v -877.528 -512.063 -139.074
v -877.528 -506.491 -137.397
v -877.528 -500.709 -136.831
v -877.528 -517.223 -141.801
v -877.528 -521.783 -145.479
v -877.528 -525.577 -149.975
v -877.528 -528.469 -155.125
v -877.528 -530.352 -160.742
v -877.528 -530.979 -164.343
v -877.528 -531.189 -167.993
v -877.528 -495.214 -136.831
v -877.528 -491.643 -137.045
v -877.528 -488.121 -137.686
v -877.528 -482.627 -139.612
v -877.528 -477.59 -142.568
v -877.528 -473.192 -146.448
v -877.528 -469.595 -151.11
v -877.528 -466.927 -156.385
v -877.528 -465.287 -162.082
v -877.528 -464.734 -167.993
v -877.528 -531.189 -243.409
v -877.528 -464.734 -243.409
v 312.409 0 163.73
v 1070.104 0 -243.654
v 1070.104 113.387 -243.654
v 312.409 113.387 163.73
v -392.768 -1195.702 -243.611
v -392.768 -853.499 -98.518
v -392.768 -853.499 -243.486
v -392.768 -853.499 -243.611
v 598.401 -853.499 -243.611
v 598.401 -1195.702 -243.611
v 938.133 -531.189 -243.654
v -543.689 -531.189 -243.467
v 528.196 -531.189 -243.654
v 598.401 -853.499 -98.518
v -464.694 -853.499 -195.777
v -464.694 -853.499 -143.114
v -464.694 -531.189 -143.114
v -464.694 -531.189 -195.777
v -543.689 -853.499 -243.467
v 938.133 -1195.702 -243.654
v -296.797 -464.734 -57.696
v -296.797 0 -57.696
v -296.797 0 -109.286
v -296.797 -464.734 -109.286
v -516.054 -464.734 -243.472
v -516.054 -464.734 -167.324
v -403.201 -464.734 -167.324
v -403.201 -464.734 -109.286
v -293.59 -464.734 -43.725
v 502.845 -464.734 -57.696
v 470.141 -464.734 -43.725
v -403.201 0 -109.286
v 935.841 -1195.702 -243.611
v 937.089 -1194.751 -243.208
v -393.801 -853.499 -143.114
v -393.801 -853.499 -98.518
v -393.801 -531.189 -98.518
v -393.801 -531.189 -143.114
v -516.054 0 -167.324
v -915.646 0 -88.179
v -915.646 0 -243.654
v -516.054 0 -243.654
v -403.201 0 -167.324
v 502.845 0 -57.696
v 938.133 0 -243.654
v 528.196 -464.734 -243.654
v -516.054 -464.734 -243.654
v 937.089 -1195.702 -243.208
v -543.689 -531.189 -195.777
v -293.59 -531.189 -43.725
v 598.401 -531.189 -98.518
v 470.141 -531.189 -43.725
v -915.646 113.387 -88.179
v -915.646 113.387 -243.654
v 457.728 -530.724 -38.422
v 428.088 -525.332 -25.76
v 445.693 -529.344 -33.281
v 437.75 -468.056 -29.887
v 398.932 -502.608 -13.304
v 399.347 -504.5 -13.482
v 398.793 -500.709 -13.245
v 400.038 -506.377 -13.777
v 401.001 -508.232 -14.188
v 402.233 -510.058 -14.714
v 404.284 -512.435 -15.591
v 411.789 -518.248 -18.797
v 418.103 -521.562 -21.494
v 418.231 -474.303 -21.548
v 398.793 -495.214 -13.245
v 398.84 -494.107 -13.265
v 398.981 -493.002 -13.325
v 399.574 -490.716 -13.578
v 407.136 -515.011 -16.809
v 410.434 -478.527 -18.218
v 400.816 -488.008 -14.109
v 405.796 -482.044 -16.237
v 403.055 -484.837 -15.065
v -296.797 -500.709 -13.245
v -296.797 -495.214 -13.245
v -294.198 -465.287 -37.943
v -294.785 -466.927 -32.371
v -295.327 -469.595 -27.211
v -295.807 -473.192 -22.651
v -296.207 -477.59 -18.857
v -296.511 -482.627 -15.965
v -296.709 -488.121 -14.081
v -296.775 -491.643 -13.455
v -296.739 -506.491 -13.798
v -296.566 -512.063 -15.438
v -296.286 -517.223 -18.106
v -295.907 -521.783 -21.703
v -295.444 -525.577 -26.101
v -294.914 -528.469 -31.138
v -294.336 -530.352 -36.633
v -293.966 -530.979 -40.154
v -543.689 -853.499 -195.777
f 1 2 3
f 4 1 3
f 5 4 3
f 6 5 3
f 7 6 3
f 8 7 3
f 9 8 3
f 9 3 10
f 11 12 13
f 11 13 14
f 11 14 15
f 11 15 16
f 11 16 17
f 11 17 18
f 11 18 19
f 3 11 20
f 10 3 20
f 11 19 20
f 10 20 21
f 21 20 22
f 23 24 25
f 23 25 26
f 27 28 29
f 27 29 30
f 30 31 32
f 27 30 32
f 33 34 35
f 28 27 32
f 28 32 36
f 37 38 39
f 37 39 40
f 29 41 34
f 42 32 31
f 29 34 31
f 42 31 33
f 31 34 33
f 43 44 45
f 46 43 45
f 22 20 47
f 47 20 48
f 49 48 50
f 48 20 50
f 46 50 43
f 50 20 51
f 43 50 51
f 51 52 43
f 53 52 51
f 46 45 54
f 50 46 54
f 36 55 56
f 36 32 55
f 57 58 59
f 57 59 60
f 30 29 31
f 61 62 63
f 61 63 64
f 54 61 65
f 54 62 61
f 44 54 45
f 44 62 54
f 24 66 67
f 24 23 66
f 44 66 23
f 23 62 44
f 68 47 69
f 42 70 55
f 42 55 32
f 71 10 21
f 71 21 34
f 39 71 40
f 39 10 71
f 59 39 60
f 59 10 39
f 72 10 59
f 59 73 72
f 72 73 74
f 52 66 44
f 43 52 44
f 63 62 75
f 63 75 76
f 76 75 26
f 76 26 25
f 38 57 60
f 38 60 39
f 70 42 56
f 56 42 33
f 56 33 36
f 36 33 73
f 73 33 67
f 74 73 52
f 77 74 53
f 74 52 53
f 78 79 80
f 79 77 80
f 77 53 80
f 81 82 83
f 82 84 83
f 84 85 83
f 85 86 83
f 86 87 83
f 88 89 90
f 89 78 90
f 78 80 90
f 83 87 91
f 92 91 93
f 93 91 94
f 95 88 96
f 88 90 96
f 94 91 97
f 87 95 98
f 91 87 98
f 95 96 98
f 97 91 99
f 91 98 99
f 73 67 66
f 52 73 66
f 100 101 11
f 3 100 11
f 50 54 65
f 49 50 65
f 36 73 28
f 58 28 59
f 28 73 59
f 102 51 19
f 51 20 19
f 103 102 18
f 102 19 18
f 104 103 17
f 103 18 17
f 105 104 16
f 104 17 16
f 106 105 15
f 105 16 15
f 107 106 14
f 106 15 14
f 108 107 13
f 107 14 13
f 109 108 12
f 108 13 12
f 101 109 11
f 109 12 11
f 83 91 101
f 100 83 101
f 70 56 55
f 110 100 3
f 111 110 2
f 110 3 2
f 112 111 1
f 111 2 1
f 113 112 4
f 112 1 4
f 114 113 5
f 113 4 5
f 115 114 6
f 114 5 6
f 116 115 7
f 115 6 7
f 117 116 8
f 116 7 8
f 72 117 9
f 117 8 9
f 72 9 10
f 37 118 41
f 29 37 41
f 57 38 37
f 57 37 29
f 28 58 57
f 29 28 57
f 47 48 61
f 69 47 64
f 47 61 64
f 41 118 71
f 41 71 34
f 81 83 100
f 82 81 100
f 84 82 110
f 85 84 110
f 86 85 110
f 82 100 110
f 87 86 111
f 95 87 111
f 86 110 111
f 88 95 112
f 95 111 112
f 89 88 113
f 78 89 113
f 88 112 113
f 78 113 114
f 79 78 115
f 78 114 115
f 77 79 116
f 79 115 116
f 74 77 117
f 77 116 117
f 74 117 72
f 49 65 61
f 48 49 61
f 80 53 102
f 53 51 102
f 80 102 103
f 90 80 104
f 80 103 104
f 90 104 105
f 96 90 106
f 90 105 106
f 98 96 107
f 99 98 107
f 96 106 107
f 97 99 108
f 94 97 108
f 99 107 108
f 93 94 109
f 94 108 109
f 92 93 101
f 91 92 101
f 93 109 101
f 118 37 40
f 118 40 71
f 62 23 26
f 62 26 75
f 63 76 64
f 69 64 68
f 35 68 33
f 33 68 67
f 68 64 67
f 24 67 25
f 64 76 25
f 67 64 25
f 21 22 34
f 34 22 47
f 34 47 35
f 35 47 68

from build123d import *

# Parameters (mm, degrees)
F1_DEPTH     = 113.387234509
F3_DEPTH     = 464.7335410118
F5_DEPTH     = 66.4555206895
F6_R         = 30.48
F8_DEPTH     = 322.3102986813
F10_DEPTH    = 342.2025442123
F12_DEPTH    = 991.1689758301
F13_T4_DEPTH = 1291.048119331


# Not quite as in the source:
# - a fillet or chamfer that OpenCascade refuses, or shapes differently, is made with other operations: its cross-section is extruded or revolved along the edge and cut away or added


with BuildPart() as f1:
    # F0 (on Front) → F1 (new body)
    with BuildSketch(Plane.XZ):
        Polygon((-915.6464338303, -243.6540126801), (1070.1038837433, -243.6540126801), (312.4090433121, 163.7299656868), (-915.6464338303, -88.1789922714), align=None)
    extrude(amount=-F1_DEPTH)

    # F2 (on face) → F3 (join)
    with BuildSketch(Plane.XZ):
        Polygon((-516.0537958145, -243.6540126801), (938.1332397461, -243.6540126801), (502.8445720673, -57.6961040497), (-296.7971563339, -57.6961040497), (-296.7971563339, -109.2859506607), (-403.2011032104, -109.2859506607), (-403.2011032104, -167.32442379), (-516.0537958145, -167.32442379), align=None)
    extrude(amount=F3_DEPTH)

    # F4 (on face) → F5 (join)
    with BuildSketch(Plane.XZ.offset(464.7335410118)):
        Polygon((528.1958580017, -243.6540126801), (938.1332397461, -243.6540126801), (398.7933658153, -13.2448096747), (-296.7971563339, -13.2448096747), (-877.5278925896, -136.8308067322), (-877.5278925896, -243.4085607529), align=None)
    extrude(amount=F5_DEPTH)

    # F6
    f6_edges = [f1.edges().sort_by_distance(p)[0] for p in [
        (50.998105, -464.733541, -13.24481),
        (50.998105, -531.189062, -13.24481),
        (-587.162524, -531.189062, -75.037808),
        (-587.162524, -464.733541, -75.037808),
    ]]
    fillet(f6_edges, radius=F6_R)

    # F7 (on face) → F8 (join)
    with BuildSketch(Plane.XZ.offset(531.1890617013)):
        Polygon((-543.689250946, -243.4668519626), (938.1332397461, -243.6540126801), (598.4011143715, -98.5184274462), (-393.8011527061, -98.5184274462), (-393.8011527061, -143.1138366461), (-464.6941423416, -143.1138366461), (-464.6941423416, -195.7771629095), (-543.689250946, -195.7771629095), align=None)
    extrude(amount=F8_DEPTH)

    # F9 (on face) → F10 (join)
    with BuildSketch(Plane.XZ.offset(853.4993603826)):
        Polygon((938.1332397461, -243.6540126801), (598.4011143715, -98.5184274462), (598.4011143715, -243.6111030139), align=None)
    extrude(amount=F10_DEPTH)

    # F11 (on face) → F12 (join)
    with BuildSketch(Plane(origin=(598.4011143715, 0, 0), x_dir=(0, -1, 0), z_dir=(-1, 0, 0))):
        Polygon((853.4993603826, -98.5184274462), (853.4993603826, -243.6111030139), (1195.7019045949, -243.6111030139), align=None)
    extrude(amount=F12_DEPTH)

    # F13: chamfer of 254 x 368.3 on 1 edges, made by hand


with BuildPart() as f13_tool2:
    # F13_s3 → F13_t4 (new body)
    with BuildSketch(Plane.XZ.offset(853.4993603826)):
        Polygon((937.089450141, -243.2080995506), (598.4011143715, -352.5184274462), (598.4011143715, -98.5184274462), align=None)
    extrude(amount=F13_T4_DEPTH)

    split(bisect_by=Plane(origin=(0, -94.6492992071, 223.2313303883), x_dir=(1, 0, 0), z_dir=(0, -0.3903579472, 0.9206631703)), keep=Keep.TOP)


with BuildPart() as f1_1:
    add(f1.part)

    # F13_t1: cut F13_tool2
    add(f13_tool2.part, mode=Mode.SUBTRACT)


solid = f1_1.part
